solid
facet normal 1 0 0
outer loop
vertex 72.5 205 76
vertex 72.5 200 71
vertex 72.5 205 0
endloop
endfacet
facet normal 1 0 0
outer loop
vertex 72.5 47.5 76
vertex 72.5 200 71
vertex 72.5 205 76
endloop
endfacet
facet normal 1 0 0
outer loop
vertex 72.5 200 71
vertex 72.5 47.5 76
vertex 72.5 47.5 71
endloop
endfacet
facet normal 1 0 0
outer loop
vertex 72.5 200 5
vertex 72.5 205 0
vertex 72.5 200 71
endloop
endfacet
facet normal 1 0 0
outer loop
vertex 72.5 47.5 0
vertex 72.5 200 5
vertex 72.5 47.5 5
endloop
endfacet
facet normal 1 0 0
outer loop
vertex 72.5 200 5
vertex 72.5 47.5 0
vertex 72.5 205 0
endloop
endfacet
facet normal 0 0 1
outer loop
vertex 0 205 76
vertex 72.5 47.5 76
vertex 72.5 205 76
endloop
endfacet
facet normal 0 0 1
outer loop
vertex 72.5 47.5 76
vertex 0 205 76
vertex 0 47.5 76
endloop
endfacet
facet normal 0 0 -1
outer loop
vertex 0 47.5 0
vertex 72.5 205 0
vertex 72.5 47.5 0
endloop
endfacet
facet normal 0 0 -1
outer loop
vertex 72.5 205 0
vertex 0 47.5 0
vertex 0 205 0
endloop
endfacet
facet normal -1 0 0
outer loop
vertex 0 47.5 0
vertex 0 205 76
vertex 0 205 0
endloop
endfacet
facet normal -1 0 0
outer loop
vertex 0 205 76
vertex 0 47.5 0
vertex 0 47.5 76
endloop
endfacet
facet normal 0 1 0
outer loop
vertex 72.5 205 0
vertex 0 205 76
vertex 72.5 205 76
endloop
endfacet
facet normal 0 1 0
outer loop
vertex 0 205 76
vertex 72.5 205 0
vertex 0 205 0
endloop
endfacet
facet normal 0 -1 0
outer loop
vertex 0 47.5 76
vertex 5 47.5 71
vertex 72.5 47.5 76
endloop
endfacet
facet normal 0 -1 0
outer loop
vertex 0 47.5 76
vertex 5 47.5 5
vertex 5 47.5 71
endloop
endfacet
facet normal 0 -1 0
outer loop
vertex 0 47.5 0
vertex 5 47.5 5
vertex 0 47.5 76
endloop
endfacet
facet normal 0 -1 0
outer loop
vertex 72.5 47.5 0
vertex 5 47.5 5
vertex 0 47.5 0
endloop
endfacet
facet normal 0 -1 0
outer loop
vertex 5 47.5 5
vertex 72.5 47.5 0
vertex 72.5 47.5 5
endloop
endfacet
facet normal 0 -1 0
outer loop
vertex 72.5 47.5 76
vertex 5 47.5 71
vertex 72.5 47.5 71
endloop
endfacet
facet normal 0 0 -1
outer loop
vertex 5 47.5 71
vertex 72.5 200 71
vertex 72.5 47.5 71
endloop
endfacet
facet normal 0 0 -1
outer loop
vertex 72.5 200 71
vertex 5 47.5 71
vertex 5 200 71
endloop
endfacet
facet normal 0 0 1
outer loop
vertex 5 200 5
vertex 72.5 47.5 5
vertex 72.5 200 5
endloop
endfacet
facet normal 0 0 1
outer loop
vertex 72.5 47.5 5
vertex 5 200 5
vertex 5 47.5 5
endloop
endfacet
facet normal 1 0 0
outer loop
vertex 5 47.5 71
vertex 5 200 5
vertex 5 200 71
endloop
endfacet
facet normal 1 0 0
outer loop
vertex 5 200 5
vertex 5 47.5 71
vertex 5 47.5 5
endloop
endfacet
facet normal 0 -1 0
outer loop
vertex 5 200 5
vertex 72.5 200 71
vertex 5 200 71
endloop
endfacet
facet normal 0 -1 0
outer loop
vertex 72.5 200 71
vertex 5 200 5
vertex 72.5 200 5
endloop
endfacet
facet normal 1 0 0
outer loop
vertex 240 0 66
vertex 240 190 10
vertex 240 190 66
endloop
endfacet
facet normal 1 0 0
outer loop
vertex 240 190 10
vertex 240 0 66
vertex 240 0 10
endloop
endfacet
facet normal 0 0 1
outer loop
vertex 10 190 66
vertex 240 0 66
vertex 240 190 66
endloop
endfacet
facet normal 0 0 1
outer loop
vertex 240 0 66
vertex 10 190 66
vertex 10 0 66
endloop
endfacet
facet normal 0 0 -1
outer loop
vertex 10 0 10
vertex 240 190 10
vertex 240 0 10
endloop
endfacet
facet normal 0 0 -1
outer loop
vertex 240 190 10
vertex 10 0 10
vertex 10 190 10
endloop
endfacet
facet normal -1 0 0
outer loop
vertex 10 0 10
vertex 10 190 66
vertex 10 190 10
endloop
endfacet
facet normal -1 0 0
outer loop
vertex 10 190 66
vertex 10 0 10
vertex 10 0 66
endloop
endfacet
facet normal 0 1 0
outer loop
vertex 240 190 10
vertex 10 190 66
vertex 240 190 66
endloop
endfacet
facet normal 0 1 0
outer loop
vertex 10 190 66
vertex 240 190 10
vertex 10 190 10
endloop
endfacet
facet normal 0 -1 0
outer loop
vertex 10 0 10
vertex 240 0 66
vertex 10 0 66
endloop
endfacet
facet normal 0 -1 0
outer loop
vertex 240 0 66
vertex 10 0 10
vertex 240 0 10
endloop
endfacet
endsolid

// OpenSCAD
union() {
	translate(v = [10.0, 0, 0]) {
		translate(v = [0, 0, 10.0]) {
			cube(size = [230, 190, 56]);
		}
	}
	difference() {
		translate(v = [0, 47.5, 0]) {
			cube(size = [72.5, 157.5, 76]);
		}
		translate(v = [5, 0, 0]) {
			translate(v = [0, 0, 5]) {
				cube(size = [240, 200, 66]);
			}
		}
	}
}
